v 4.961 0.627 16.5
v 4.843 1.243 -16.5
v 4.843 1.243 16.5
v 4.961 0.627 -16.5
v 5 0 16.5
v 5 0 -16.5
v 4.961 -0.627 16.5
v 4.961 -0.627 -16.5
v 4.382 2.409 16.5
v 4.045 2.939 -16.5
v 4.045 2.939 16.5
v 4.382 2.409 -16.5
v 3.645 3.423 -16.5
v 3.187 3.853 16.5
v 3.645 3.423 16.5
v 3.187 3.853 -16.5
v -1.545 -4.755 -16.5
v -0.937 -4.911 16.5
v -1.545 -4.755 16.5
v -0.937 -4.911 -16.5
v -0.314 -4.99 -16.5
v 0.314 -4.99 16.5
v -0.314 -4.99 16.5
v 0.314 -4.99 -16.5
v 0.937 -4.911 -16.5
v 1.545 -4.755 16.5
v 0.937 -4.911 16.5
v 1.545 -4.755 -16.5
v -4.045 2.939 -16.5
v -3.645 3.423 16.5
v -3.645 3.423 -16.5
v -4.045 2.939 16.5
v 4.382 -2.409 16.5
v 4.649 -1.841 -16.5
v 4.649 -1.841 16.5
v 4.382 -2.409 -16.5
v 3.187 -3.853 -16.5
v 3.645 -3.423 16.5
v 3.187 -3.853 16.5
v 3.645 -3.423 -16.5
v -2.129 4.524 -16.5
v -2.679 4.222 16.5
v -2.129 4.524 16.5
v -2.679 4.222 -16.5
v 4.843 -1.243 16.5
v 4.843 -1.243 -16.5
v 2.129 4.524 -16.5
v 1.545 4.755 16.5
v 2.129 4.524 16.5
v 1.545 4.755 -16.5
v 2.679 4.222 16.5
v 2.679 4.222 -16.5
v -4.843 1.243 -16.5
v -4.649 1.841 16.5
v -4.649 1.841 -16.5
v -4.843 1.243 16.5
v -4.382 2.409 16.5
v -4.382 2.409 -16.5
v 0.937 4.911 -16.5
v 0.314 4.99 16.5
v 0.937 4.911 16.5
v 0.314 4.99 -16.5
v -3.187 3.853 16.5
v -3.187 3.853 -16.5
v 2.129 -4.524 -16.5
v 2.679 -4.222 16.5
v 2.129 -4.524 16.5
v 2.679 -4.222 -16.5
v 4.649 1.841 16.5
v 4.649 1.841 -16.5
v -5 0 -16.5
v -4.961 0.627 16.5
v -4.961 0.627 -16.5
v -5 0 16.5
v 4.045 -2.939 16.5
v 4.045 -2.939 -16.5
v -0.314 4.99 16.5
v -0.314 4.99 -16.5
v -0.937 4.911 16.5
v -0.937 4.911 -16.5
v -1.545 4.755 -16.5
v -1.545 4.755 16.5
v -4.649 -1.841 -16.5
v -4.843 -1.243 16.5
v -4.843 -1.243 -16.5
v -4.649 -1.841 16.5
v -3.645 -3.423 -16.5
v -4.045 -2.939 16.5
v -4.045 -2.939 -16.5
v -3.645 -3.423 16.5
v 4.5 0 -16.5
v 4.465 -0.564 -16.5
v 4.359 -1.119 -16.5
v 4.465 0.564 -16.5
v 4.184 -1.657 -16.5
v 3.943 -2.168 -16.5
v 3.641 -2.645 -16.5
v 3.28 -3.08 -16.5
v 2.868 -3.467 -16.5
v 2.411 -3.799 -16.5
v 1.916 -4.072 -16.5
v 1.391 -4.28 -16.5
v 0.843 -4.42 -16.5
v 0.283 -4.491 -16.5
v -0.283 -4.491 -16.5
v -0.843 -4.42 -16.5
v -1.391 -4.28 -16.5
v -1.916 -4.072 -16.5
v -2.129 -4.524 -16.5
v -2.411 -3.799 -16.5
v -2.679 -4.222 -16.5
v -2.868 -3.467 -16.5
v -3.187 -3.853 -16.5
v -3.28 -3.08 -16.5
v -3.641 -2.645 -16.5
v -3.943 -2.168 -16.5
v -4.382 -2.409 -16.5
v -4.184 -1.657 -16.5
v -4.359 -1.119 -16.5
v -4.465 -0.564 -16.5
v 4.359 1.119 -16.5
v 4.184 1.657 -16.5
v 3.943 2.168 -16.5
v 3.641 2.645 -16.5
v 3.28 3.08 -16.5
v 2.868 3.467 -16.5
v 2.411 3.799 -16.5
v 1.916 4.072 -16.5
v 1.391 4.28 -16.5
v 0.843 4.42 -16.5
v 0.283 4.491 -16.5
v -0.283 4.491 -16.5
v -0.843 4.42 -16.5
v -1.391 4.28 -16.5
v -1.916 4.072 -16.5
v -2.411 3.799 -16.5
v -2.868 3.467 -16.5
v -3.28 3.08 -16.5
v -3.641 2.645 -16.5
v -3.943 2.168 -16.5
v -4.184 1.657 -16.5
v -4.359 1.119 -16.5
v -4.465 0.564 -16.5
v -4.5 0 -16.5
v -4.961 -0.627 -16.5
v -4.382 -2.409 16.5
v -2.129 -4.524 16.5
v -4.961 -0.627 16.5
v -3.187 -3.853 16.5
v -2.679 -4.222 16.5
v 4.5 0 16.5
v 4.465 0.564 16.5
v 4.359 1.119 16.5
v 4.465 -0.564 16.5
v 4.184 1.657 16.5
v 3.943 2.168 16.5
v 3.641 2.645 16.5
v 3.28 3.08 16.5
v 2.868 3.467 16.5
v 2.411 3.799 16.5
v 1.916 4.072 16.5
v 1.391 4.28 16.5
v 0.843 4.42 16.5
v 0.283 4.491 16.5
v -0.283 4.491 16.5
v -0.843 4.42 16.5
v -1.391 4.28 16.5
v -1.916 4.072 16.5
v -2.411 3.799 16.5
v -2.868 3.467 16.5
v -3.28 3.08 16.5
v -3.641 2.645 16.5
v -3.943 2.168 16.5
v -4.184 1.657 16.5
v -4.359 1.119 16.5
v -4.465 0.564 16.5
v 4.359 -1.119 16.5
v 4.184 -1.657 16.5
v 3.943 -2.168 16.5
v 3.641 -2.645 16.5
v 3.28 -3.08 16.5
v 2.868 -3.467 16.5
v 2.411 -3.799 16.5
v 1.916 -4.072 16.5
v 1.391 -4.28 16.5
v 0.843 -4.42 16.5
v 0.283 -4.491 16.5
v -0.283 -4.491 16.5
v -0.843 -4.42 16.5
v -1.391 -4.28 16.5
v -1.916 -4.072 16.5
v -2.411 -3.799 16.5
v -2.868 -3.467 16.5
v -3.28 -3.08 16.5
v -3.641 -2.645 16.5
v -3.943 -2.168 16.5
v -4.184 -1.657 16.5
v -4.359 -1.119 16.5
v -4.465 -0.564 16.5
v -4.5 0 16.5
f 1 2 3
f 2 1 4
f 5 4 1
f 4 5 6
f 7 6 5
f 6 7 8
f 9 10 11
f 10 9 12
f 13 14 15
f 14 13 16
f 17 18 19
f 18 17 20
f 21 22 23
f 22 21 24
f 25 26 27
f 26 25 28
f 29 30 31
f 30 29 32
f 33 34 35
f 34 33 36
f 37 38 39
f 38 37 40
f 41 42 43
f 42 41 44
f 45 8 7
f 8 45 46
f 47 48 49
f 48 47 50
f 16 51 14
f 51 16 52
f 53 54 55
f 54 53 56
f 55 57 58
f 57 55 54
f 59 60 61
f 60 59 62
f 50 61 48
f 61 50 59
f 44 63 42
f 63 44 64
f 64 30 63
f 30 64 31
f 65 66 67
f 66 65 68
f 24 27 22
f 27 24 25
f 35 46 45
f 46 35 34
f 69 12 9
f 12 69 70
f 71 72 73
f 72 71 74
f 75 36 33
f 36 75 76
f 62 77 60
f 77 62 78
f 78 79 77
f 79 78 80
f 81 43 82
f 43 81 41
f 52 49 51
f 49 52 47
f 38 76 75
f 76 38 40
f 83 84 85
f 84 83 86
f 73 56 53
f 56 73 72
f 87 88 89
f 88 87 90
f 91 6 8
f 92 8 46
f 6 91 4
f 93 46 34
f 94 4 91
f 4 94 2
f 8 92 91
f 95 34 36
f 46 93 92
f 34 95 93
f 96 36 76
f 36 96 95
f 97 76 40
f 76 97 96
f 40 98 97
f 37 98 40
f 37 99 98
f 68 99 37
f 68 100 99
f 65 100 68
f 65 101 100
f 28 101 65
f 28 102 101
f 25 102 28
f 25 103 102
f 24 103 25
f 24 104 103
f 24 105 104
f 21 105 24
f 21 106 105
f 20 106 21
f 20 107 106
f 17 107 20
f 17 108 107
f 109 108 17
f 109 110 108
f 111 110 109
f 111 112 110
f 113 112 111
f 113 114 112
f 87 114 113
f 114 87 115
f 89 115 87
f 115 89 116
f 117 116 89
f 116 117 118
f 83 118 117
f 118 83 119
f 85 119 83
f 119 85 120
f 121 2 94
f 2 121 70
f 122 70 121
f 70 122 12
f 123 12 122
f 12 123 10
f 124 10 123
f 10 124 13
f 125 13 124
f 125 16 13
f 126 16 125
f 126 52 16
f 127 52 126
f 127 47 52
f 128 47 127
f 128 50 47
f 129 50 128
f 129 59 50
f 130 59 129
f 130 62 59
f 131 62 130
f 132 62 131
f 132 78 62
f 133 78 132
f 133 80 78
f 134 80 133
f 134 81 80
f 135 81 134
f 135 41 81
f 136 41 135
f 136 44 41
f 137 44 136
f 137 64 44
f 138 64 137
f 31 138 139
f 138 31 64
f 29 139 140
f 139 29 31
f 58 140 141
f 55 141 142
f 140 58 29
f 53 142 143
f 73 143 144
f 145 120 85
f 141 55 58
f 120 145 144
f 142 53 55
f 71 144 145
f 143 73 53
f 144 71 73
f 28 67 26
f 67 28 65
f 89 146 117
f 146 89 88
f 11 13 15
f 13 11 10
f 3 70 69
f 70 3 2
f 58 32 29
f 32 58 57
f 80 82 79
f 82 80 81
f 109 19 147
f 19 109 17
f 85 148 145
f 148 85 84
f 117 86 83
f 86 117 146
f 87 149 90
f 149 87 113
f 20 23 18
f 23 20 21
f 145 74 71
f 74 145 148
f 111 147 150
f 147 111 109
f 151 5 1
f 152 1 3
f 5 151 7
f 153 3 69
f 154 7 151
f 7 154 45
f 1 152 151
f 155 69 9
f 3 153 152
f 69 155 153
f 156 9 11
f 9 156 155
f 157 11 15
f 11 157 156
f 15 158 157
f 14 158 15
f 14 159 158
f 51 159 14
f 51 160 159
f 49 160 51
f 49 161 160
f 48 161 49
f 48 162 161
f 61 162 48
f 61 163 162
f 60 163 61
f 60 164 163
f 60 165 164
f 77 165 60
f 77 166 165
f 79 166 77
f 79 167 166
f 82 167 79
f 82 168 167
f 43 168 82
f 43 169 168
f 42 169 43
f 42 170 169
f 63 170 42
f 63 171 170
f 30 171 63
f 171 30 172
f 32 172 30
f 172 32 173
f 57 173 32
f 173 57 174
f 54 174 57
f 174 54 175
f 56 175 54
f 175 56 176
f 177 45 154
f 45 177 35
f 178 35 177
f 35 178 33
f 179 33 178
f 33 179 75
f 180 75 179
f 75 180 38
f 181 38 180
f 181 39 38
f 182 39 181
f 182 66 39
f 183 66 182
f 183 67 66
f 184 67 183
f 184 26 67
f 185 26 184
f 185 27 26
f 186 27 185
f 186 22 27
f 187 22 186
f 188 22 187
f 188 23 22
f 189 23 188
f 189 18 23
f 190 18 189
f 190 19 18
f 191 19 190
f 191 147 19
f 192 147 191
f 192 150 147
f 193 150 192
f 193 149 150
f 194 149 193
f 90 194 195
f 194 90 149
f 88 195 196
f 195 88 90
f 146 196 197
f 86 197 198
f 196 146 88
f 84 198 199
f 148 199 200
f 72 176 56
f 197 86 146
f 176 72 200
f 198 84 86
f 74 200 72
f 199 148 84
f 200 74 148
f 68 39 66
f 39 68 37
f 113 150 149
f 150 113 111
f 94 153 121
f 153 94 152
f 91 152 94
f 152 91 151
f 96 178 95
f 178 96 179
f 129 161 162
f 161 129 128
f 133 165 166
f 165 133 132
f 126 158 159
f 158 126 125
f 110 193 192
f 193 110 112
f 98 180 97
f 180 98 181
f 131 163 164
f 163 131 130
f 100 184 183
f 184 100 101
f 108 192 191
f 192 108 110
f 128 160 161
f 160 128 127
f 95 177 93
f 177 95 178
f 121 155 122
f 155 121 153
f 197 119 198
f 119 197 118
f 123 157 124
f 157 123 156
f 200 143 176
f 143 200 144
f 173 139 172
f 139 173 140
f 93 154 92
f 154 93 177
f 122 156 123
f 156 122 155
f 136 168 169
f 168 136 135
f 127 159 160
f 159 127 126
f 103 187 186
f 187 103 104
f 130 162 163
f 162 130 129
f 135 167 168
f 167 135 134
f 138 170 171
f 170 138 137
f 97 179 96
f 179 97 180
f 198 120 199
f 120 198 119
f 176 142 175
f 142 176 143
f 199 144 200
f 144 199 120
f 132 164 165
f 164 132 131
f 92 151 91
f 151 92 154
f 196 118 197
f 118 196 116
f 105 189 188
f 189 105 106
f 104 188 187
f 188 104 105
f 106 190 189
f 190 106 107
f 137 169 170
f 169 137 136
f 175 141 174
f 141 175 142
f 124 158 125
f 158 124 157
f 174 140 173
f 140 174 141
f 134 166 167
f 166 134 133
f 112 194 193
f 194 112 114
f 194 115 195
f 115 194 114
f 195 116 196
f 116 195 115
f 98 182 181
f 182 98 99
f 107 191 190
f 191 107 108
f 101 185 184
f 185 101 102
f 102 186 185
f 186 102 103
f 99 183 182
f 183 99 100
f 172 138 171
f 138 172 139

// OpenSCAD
$fn = 50;


difference() {
	union() {
		translate(v = [0, 0, -16.5000000000]) {
			cylinder(h = 33, r = 5.0000000000);
		}
	}
	union() {
		translate(v = [0, 0, -100.0000000000]) {
			cylinder(h = 200, r = 4.5000000000);
		}
	}
}
